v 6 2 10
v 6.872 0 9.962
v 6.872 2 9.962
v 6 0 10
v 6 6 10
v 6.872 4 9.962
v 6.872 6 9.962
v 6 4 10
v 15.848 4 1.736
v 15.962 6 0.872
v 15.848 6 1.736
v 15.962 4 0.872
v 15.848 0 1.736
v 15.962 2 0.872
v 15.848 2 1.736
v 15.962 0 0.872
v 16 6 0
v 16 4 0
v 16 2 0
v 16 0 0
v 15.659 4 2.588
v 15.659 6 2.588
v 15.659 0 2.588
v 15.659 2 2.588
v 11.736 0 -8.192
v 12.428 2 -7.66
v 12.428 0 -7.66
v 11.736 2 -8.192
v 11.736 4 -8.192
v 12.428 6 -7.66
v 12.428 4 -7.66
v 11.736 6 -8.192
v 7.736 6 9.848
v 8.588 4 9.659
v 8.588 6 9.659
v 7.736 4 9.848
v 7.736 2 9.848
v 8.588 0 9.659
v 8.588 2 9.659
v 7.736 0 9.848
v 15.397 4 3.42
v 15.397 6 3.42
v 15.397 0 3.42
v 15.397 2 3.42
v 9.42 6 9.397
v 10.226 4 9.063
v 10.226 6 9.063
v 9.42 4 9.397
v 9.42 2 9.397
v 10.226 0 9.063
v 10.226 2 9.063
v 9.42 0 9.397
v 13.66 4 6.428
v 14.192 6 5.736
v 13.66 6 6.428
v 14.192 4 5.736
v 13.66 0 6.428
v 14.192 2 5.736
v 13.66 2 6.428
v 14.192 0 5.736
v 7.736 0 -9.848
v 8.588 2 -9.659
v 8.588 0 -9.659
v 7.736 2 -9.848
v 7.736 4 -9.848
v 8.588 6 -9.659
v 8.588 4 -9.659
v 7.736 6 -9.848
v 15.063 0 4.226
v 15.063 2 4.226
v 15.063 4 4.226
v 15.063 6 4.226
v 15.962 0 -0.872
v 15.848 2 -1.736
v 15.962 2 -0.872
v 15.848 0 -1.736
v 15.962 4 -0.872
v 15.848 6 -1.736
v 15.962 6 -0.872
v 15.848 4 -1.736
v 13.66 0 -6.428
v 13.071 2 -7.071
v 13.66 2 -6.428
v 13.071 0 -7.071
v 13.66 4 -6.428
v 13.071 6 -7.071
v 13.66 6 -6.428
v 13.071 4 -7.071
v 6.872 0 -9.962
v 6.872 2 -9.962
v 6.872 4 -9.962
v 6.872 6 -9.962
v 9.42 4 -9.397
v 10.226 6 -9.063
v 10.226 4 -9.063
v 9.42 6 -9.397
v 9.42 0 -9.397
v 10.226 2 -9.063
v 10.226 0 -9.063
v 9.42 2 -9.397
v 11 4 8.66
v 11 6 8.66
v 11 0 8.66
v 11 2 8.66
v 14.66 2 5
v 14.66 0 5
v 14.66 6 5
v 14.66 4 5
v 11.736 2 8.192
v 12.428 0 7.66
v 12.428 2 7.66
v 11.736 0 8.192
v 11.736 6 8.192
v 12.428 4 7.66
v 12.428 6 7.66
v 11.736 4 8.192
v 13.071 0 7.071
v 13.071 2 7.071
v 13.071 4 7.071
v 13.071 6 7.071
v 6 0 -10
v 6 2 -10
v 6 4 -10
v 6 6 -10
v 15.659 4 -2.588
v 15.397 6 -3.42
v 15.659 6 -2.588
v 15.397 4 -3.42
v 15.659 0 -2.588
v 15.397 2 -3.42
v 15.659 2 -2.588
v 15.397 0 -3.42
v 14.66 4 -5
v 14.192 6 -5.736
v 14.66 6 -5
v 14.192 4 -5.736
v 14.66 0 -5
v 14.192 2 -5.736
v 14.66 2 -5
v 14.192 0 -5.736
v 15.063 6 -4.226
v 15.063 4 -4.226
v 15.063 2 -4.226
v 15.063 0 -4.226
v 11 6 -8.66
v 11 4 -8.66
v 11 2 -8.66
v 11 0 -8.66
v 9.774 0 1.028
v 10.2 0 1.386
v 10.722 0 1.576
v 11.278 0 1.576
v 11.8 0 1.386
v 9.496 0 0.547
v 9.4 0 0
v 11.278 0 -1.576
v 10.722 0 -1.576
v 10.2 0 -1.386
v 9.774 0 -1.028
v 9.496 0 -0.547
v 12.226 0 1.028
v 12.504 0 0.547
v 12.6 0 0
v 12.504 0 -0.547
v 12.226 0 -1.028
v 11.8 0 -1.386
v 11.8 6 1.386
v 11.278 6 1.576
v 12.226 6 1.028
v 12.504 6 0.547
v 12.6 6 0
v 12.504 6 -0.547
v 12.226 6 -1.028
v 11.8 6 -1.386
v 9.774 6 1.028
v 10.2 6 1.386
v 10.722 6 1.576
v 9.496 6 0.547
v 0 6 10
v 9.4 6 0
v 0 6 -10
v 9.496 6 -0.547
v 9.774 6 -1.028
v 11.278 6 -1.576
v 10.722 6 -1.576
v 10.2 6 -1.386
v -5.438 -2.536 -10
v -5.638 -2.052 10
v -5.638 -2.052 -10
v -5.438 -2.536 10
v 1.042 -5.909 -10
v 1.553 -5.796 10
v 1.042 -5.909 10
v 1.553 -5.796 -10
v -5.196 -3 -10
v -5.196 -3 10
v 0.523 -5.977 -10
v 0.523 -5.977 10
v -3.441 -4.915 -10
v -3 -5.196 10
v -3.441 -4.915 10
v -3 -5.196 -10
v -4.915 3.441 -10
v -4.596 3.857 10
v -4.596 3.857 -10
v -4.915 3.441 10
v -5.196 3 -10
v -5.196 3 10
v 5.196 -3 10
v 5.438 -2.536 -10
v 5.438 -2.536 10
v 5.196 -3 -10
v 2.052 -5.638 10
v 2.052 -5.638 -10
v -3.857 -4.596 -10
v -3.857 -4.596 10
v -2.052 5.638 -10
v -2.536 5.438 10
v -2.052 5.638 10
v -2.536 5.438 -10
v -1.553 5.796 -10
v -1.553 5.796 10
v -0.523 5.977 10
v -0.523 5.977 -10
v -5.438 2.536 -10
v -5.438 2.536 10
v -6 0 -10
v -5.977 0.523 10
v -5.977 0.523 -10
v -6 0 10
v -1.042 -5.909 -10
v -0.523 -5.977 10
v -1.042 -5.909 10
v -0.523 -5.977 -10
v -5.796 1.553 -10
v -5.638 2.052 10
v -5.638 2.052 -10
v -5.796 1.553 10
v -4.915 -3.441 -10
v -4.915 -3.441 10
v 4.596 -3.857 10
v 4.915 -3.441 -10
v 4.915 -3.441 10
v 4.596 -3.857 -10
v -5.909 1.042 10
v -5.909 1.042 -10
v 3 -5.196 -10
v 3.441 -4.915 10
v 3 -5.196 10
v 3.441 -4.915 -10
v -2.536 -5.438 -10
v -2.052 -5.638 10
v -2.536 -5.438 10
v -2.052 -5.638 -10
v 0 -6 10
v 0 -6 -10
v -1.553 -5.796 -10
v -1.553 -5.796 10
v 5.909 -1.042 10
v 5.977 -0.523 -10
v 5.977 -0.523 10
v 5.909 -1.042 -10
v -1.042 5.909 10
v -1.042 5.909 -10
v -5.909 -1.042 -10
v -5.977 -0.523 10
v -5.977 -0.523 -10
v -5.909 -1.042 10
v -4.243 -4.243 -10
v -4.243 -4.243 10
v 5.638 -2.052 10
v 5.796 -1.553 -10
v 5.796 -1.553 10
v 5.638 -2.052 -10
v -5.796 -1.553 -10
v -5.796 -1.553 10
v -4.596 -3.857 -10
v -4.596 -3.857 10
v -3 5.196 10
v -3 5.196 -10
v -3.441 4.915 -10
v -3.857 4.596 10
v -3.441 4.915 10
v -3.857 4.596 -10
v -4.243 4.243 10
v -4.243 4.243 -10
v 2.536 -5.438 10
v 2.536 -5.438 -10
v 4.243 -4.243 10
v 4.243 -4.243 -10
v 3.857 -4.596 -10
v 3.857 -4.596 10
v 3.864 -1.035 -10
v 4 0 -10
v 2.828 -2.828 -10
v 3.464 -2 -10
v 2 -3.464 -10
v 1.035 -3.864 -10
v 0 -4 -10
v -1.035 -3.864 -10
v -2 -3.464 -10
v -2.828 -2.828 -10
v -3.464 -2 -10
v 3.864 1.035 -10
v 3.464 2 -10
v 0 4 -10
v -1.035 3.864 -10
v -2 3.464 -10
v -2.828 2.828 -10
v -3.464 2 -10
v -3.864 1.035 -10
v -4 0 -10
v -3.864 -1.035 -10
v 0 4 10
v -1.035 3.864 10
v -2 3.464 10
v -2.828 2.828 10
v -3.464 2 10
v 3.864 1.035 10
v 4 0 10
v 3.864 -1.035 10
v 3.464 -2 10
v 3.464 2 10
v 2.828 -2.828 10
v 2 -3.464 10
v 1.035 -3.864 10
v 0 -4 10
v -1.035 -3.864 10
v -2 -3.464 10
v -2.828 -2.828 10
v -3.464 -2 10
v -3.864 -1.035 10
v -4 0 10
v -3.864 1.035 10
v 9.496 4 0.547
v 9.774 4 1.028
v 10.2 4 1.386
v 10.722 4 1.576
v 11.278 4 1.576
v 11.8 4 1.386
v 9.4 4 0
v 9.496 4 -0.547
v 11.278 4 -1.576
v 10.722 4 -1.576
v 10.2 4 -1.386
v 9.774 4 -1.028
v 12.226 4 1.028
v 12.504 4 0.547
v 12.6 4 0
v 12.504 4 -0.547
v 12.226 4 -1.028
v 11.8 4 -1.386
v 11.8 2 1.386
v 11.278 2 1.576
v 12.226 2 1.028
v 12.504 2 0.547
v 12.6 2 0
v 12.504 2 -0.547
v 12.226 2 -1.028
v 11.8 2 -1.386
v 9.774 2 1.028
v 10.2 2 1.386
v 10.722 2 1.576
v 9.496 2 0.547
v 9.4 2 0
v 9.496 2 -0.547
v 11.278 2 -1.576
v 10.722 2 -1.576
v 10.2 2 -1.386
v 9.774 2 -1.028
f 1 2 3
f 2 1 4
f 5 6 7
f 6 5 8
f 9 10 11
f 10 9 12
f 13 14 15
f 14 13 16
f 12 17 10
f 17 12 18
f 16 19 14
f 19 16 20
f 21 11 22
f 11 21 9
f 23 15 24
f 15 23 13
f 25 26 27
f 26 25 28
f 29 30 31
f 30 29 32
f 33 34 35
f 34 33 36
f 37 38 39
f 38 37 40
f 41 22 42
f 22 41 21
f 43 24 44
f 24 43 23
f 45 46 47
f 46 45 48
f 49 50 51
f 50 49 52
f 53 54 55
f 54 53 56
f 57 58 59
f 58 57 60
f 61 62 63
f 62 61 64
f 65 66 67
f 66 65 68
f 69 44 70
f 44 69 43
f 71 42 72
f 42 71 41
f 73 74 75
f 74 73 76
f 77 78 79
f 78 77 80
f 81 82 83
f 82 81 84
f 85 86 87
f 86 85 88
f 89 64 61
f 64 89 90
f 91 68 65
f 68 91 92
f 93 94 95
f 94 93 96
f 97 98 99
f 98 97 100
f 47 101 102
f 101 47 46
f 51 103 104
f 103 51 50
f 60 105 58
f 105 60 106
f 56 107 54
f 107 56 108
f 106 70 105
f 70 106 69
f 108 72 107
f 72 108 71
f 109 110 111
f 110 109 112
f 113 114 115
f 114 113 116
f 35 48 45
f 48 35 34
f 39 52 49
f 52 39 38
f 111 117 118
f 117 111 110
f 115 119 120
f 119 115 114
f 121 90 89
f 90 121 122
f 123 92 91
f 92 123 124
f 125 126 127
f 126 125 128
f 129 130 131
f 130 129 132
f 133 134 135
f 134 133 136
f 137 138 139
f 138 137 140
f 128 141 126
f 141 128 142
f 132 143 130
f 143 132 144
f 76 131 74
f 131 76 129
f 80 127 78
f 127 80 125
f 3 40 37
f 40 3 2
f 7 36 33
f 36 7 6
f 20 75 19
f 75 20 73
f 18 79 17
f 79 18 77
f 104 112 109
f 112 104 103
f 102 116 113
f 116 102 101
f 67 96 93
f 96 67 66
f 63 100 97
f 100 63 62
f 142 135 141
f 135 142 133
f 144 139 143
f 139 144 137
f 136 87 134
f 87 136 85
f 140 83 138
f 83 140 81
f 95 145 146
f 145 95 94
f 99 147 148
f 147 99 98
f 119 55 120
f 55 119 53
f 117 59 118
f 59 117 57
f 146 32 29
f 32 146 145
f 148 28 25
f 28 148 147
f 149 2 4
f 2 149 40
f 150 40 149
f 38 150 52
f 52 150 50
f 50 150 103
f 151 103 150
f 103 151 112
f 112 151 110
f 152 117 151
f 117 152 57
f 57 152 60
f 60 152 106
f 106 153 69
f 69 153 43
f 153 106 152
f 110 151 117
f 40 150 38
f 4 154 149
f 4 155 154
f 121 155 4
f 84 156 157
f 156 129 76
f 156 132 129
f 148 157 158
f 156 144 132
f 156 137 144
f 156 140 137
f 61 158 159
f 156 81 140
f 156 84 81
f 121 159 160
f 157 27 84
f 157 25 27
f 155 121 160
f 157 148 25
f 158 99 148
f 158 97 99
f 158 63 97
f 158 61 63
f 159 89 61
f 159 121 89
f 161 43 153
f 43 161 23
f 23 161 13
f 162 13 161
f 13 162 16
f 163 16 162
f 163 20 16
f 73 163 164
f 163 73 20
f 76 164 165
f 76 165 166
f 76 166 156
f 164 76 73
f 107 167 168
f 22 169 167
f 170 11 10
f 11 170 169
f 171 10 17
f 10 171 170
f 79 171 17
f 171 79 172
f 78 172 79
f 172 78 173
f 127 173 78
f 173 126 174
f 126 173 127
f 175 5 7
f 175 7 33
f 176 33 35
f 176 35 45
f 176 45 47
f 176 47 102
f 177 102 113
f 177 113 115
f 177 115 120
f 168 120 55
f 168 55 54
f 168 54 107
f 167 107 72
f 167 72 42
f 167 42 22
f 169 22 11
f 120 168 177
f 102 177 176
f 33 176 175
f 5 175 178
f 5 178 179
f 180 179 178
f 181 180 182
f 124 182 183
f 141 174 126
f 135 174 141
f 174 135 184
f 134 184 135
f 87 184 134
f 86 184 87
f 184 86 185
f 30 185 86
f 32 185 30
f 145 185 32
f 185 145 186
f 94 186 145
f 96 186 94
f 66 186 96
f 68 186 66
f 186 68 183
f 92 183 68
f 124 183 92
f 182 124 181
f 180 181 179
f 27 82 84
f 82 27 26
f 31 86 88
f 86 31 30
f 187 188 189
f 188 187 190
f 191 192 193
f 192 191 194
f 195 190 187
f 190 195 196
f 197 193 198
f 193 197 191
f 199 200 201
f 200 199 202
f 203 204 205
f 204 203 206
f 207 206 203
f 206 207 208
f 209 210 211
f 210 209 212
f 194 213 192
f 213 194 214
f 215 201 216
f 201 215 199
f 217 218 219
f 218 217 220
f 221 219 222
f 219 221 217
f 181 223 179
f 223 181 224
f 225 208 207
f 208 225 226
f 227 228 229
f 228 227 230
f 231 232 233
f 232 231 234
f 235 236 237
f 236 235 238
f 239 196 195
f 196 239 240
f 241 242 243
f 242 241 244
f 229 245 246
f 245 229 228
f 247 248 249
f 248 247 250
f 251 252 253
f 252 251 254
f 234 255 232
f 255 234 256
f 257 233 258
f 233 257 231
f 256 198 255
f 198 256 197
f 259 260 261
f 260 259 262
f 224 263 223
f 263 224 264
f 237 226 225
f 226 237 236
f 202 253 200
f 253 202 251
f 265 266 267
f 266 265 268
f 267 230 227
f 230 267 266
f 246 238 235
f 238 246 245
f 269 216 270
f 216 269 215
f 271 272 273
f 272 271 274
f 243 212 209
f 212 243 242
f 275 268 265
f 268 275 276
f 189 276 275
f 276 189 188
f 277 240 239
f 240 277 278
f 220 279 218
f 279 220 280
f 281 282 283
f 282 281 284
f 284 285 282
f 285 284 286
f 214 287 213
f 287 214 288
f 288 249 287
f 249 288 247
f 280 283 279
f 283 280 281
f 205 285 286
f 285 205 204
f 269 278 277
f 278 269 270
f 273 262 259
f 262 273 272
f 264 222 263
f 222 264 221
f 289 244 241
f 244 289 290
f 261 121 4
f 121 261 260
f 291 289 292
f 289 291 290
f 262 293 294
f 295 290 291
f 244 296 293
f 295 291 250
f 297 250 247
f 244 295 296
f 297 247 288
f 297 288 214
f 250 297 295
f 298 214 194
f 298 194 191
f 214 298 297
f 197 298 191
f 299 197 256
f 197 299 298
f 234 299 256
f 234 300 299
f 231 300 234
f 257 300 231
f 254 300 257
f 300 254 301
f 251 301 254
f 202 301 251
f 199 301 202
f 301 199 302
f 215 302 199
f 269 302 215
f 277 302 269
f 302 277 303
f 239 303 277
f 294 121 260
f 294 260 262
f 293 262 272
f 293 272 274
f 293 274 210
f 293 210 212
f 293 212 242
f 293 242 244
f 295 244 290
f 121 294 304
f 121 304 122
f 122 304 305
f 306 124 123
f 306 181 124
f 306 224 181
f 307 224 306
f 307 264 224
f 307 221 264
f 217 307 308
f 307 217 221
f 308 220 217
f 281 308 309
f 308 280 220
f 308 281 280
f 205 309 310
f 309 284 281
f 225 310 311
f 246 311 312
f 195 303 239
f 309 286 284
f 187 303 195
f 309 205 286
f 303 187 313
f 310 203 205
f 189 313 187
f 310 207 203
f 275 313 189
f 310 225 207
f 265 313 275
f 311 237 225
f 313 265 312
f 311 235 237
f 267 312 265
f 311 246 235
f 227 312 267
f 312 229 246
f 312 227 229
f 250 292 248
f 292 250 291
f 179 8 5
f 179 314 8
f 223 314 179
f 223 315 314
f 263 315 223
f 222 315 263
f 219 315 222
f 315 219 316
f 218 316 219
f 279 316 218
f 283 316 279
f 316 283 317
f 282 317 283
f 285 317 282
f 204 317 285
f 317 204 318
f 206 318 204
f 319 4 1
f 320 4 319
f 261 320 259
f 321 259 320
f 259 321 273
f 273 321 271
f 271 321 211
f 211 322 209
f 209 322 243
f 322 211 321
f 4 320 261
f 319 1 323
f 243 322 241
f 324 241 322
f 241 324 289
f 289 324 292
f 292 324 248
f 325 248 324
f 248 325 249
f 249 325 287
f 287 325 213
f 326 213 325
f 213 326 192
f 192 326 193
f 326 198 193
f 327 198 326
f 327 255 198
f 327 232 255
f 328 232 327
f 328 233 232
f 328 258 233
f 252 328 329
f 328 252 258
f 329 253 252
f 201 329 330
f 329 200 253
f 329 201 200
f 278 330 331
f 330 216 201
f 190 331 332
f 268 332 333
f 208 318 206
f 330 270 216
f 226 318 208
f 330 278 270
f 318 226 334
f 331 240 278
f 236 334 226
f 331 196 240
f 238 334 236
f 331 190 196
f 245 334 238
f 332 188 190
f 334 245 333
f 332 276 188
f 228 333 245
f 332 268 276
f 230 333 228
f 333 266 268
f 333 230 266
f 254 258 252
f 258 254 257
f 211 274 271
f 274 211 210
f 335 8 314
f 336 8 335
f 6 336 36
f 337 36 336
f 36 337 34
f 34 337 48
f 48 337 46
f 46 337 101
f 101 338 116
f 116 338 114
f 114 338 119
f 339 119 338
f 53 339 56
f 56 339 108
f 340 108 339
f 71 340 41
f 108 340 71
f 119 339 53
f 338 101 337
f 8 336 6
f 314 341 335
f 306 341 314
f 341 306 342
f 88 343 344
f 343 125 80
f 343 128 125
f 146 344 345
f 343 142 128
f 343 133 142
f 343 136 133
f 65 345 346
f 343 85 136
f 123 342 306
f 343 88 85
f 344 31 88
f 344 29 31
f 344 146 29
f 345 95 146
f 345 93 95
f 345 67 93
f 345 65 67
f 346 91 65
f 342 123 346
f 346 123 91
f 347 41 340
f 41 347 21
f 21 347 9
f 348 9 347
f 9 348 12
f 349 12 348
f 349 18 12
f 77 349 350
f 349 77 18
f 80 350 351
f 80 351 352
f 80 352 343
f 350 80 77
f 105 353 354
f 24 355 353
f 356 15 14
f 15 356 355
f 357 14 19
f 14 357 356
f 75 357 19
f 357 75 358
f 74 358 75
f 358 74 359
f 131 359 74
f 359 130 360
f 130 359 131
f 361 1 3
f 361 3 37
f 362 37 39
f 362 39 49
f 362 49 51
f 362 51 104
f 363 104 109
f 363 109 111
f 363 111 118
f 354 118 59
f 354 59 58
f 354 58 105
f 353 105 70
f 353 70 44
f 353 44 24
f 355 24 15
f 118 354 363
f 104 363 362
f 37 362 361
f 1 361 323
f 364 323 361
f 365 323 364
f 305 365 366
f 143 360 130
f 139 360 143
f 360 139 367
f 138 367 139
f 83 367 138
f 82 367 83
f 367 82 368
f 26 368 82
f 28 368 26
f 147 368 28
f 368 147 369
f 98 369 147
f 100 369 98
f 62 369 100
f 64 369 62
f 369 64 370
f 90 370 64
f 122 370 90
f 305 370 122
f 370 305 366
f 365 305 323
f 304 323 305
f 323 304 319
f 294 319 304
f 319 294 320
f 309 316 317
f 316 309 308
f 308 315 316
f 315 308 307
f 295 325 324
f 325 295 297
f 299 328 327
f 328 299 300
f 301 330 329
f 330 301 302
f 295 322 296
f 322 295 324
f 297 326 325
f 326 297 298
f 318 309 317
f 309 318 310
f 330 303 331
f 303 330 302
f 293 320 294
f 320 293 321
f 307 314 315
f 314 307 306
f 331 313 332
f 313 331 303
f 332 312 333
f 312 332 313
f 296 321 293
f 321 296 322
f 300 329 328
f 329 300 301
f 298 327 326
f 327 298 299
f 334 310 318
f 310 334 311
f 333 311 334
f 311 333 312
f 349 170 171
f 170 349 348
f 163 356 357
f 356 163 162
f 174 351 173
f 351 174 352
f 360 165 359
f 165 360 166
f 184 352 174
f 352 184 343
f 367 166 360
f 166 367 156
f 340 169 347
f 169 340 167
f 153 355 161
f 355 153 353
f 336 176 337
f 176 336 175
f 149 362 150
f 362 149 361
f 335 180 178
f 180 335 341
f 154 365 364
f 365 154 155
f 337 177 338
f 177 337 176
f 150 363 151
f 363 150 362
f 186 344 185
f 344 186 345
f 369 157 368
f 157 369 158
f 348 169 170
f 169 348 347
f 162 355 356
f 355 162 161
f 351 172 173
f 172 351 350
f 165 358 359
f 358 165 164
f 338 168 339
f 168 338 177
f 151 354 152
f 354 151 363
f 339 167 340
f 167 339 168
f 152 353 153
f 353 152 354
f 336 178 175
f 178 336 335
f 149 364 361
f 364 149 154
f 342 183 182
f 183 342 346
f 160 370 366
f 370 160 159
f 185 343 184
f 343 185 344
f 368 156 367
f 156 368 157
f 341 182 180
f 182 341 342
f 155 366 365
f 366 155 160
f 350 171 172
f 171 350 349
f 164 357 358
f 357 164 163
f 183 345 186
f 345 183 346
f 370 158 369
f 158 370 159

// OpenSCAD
//The radius of the cable thickness
cable_thickness_r = 4;

//The strength/thickness of the wall
wall_thickness = 2;

//The height of the clip
height = 20;

/* [Hidden] */
outer_size = cable_thickness_r + wall_thickness;

difference()
{
    //Outside shell
    union()
    {
        hull()
        {
            cylinder(r=outer_size,h=height,$fn=72, center=true);

            translate([0,0,-height/2])
            cube([outer_size,outer_size,height]);
        }
        
        difference()
        {
            translate([outer_size,outer_size/2,0])
            rotate([90,0,0])
            cylinder(r=height/2,h=outer_size,$fn=72,center=true);
            
            translate([-outer_size - height,-1,-height/2])
            cube([outer_size + height,outer_size + 2,height]);
        }
    }
    
    //Remove thightner opening
    translate([0,wall_thickness,-height/2])
    cube([height + outer_size,outer_size - wall_thickness*2,height]);

    //make center cable hole
    cylinder(r=cable_thickness_r,h=height+1,center=true,$fn=24);
    
    //make mounting hole
    translate([outer_size + height/4,0,0])
    rotate([90,0,0])
    cylinder(r=1.6,h=(outer_size*2)+1,center=true,$fn=18);
}
